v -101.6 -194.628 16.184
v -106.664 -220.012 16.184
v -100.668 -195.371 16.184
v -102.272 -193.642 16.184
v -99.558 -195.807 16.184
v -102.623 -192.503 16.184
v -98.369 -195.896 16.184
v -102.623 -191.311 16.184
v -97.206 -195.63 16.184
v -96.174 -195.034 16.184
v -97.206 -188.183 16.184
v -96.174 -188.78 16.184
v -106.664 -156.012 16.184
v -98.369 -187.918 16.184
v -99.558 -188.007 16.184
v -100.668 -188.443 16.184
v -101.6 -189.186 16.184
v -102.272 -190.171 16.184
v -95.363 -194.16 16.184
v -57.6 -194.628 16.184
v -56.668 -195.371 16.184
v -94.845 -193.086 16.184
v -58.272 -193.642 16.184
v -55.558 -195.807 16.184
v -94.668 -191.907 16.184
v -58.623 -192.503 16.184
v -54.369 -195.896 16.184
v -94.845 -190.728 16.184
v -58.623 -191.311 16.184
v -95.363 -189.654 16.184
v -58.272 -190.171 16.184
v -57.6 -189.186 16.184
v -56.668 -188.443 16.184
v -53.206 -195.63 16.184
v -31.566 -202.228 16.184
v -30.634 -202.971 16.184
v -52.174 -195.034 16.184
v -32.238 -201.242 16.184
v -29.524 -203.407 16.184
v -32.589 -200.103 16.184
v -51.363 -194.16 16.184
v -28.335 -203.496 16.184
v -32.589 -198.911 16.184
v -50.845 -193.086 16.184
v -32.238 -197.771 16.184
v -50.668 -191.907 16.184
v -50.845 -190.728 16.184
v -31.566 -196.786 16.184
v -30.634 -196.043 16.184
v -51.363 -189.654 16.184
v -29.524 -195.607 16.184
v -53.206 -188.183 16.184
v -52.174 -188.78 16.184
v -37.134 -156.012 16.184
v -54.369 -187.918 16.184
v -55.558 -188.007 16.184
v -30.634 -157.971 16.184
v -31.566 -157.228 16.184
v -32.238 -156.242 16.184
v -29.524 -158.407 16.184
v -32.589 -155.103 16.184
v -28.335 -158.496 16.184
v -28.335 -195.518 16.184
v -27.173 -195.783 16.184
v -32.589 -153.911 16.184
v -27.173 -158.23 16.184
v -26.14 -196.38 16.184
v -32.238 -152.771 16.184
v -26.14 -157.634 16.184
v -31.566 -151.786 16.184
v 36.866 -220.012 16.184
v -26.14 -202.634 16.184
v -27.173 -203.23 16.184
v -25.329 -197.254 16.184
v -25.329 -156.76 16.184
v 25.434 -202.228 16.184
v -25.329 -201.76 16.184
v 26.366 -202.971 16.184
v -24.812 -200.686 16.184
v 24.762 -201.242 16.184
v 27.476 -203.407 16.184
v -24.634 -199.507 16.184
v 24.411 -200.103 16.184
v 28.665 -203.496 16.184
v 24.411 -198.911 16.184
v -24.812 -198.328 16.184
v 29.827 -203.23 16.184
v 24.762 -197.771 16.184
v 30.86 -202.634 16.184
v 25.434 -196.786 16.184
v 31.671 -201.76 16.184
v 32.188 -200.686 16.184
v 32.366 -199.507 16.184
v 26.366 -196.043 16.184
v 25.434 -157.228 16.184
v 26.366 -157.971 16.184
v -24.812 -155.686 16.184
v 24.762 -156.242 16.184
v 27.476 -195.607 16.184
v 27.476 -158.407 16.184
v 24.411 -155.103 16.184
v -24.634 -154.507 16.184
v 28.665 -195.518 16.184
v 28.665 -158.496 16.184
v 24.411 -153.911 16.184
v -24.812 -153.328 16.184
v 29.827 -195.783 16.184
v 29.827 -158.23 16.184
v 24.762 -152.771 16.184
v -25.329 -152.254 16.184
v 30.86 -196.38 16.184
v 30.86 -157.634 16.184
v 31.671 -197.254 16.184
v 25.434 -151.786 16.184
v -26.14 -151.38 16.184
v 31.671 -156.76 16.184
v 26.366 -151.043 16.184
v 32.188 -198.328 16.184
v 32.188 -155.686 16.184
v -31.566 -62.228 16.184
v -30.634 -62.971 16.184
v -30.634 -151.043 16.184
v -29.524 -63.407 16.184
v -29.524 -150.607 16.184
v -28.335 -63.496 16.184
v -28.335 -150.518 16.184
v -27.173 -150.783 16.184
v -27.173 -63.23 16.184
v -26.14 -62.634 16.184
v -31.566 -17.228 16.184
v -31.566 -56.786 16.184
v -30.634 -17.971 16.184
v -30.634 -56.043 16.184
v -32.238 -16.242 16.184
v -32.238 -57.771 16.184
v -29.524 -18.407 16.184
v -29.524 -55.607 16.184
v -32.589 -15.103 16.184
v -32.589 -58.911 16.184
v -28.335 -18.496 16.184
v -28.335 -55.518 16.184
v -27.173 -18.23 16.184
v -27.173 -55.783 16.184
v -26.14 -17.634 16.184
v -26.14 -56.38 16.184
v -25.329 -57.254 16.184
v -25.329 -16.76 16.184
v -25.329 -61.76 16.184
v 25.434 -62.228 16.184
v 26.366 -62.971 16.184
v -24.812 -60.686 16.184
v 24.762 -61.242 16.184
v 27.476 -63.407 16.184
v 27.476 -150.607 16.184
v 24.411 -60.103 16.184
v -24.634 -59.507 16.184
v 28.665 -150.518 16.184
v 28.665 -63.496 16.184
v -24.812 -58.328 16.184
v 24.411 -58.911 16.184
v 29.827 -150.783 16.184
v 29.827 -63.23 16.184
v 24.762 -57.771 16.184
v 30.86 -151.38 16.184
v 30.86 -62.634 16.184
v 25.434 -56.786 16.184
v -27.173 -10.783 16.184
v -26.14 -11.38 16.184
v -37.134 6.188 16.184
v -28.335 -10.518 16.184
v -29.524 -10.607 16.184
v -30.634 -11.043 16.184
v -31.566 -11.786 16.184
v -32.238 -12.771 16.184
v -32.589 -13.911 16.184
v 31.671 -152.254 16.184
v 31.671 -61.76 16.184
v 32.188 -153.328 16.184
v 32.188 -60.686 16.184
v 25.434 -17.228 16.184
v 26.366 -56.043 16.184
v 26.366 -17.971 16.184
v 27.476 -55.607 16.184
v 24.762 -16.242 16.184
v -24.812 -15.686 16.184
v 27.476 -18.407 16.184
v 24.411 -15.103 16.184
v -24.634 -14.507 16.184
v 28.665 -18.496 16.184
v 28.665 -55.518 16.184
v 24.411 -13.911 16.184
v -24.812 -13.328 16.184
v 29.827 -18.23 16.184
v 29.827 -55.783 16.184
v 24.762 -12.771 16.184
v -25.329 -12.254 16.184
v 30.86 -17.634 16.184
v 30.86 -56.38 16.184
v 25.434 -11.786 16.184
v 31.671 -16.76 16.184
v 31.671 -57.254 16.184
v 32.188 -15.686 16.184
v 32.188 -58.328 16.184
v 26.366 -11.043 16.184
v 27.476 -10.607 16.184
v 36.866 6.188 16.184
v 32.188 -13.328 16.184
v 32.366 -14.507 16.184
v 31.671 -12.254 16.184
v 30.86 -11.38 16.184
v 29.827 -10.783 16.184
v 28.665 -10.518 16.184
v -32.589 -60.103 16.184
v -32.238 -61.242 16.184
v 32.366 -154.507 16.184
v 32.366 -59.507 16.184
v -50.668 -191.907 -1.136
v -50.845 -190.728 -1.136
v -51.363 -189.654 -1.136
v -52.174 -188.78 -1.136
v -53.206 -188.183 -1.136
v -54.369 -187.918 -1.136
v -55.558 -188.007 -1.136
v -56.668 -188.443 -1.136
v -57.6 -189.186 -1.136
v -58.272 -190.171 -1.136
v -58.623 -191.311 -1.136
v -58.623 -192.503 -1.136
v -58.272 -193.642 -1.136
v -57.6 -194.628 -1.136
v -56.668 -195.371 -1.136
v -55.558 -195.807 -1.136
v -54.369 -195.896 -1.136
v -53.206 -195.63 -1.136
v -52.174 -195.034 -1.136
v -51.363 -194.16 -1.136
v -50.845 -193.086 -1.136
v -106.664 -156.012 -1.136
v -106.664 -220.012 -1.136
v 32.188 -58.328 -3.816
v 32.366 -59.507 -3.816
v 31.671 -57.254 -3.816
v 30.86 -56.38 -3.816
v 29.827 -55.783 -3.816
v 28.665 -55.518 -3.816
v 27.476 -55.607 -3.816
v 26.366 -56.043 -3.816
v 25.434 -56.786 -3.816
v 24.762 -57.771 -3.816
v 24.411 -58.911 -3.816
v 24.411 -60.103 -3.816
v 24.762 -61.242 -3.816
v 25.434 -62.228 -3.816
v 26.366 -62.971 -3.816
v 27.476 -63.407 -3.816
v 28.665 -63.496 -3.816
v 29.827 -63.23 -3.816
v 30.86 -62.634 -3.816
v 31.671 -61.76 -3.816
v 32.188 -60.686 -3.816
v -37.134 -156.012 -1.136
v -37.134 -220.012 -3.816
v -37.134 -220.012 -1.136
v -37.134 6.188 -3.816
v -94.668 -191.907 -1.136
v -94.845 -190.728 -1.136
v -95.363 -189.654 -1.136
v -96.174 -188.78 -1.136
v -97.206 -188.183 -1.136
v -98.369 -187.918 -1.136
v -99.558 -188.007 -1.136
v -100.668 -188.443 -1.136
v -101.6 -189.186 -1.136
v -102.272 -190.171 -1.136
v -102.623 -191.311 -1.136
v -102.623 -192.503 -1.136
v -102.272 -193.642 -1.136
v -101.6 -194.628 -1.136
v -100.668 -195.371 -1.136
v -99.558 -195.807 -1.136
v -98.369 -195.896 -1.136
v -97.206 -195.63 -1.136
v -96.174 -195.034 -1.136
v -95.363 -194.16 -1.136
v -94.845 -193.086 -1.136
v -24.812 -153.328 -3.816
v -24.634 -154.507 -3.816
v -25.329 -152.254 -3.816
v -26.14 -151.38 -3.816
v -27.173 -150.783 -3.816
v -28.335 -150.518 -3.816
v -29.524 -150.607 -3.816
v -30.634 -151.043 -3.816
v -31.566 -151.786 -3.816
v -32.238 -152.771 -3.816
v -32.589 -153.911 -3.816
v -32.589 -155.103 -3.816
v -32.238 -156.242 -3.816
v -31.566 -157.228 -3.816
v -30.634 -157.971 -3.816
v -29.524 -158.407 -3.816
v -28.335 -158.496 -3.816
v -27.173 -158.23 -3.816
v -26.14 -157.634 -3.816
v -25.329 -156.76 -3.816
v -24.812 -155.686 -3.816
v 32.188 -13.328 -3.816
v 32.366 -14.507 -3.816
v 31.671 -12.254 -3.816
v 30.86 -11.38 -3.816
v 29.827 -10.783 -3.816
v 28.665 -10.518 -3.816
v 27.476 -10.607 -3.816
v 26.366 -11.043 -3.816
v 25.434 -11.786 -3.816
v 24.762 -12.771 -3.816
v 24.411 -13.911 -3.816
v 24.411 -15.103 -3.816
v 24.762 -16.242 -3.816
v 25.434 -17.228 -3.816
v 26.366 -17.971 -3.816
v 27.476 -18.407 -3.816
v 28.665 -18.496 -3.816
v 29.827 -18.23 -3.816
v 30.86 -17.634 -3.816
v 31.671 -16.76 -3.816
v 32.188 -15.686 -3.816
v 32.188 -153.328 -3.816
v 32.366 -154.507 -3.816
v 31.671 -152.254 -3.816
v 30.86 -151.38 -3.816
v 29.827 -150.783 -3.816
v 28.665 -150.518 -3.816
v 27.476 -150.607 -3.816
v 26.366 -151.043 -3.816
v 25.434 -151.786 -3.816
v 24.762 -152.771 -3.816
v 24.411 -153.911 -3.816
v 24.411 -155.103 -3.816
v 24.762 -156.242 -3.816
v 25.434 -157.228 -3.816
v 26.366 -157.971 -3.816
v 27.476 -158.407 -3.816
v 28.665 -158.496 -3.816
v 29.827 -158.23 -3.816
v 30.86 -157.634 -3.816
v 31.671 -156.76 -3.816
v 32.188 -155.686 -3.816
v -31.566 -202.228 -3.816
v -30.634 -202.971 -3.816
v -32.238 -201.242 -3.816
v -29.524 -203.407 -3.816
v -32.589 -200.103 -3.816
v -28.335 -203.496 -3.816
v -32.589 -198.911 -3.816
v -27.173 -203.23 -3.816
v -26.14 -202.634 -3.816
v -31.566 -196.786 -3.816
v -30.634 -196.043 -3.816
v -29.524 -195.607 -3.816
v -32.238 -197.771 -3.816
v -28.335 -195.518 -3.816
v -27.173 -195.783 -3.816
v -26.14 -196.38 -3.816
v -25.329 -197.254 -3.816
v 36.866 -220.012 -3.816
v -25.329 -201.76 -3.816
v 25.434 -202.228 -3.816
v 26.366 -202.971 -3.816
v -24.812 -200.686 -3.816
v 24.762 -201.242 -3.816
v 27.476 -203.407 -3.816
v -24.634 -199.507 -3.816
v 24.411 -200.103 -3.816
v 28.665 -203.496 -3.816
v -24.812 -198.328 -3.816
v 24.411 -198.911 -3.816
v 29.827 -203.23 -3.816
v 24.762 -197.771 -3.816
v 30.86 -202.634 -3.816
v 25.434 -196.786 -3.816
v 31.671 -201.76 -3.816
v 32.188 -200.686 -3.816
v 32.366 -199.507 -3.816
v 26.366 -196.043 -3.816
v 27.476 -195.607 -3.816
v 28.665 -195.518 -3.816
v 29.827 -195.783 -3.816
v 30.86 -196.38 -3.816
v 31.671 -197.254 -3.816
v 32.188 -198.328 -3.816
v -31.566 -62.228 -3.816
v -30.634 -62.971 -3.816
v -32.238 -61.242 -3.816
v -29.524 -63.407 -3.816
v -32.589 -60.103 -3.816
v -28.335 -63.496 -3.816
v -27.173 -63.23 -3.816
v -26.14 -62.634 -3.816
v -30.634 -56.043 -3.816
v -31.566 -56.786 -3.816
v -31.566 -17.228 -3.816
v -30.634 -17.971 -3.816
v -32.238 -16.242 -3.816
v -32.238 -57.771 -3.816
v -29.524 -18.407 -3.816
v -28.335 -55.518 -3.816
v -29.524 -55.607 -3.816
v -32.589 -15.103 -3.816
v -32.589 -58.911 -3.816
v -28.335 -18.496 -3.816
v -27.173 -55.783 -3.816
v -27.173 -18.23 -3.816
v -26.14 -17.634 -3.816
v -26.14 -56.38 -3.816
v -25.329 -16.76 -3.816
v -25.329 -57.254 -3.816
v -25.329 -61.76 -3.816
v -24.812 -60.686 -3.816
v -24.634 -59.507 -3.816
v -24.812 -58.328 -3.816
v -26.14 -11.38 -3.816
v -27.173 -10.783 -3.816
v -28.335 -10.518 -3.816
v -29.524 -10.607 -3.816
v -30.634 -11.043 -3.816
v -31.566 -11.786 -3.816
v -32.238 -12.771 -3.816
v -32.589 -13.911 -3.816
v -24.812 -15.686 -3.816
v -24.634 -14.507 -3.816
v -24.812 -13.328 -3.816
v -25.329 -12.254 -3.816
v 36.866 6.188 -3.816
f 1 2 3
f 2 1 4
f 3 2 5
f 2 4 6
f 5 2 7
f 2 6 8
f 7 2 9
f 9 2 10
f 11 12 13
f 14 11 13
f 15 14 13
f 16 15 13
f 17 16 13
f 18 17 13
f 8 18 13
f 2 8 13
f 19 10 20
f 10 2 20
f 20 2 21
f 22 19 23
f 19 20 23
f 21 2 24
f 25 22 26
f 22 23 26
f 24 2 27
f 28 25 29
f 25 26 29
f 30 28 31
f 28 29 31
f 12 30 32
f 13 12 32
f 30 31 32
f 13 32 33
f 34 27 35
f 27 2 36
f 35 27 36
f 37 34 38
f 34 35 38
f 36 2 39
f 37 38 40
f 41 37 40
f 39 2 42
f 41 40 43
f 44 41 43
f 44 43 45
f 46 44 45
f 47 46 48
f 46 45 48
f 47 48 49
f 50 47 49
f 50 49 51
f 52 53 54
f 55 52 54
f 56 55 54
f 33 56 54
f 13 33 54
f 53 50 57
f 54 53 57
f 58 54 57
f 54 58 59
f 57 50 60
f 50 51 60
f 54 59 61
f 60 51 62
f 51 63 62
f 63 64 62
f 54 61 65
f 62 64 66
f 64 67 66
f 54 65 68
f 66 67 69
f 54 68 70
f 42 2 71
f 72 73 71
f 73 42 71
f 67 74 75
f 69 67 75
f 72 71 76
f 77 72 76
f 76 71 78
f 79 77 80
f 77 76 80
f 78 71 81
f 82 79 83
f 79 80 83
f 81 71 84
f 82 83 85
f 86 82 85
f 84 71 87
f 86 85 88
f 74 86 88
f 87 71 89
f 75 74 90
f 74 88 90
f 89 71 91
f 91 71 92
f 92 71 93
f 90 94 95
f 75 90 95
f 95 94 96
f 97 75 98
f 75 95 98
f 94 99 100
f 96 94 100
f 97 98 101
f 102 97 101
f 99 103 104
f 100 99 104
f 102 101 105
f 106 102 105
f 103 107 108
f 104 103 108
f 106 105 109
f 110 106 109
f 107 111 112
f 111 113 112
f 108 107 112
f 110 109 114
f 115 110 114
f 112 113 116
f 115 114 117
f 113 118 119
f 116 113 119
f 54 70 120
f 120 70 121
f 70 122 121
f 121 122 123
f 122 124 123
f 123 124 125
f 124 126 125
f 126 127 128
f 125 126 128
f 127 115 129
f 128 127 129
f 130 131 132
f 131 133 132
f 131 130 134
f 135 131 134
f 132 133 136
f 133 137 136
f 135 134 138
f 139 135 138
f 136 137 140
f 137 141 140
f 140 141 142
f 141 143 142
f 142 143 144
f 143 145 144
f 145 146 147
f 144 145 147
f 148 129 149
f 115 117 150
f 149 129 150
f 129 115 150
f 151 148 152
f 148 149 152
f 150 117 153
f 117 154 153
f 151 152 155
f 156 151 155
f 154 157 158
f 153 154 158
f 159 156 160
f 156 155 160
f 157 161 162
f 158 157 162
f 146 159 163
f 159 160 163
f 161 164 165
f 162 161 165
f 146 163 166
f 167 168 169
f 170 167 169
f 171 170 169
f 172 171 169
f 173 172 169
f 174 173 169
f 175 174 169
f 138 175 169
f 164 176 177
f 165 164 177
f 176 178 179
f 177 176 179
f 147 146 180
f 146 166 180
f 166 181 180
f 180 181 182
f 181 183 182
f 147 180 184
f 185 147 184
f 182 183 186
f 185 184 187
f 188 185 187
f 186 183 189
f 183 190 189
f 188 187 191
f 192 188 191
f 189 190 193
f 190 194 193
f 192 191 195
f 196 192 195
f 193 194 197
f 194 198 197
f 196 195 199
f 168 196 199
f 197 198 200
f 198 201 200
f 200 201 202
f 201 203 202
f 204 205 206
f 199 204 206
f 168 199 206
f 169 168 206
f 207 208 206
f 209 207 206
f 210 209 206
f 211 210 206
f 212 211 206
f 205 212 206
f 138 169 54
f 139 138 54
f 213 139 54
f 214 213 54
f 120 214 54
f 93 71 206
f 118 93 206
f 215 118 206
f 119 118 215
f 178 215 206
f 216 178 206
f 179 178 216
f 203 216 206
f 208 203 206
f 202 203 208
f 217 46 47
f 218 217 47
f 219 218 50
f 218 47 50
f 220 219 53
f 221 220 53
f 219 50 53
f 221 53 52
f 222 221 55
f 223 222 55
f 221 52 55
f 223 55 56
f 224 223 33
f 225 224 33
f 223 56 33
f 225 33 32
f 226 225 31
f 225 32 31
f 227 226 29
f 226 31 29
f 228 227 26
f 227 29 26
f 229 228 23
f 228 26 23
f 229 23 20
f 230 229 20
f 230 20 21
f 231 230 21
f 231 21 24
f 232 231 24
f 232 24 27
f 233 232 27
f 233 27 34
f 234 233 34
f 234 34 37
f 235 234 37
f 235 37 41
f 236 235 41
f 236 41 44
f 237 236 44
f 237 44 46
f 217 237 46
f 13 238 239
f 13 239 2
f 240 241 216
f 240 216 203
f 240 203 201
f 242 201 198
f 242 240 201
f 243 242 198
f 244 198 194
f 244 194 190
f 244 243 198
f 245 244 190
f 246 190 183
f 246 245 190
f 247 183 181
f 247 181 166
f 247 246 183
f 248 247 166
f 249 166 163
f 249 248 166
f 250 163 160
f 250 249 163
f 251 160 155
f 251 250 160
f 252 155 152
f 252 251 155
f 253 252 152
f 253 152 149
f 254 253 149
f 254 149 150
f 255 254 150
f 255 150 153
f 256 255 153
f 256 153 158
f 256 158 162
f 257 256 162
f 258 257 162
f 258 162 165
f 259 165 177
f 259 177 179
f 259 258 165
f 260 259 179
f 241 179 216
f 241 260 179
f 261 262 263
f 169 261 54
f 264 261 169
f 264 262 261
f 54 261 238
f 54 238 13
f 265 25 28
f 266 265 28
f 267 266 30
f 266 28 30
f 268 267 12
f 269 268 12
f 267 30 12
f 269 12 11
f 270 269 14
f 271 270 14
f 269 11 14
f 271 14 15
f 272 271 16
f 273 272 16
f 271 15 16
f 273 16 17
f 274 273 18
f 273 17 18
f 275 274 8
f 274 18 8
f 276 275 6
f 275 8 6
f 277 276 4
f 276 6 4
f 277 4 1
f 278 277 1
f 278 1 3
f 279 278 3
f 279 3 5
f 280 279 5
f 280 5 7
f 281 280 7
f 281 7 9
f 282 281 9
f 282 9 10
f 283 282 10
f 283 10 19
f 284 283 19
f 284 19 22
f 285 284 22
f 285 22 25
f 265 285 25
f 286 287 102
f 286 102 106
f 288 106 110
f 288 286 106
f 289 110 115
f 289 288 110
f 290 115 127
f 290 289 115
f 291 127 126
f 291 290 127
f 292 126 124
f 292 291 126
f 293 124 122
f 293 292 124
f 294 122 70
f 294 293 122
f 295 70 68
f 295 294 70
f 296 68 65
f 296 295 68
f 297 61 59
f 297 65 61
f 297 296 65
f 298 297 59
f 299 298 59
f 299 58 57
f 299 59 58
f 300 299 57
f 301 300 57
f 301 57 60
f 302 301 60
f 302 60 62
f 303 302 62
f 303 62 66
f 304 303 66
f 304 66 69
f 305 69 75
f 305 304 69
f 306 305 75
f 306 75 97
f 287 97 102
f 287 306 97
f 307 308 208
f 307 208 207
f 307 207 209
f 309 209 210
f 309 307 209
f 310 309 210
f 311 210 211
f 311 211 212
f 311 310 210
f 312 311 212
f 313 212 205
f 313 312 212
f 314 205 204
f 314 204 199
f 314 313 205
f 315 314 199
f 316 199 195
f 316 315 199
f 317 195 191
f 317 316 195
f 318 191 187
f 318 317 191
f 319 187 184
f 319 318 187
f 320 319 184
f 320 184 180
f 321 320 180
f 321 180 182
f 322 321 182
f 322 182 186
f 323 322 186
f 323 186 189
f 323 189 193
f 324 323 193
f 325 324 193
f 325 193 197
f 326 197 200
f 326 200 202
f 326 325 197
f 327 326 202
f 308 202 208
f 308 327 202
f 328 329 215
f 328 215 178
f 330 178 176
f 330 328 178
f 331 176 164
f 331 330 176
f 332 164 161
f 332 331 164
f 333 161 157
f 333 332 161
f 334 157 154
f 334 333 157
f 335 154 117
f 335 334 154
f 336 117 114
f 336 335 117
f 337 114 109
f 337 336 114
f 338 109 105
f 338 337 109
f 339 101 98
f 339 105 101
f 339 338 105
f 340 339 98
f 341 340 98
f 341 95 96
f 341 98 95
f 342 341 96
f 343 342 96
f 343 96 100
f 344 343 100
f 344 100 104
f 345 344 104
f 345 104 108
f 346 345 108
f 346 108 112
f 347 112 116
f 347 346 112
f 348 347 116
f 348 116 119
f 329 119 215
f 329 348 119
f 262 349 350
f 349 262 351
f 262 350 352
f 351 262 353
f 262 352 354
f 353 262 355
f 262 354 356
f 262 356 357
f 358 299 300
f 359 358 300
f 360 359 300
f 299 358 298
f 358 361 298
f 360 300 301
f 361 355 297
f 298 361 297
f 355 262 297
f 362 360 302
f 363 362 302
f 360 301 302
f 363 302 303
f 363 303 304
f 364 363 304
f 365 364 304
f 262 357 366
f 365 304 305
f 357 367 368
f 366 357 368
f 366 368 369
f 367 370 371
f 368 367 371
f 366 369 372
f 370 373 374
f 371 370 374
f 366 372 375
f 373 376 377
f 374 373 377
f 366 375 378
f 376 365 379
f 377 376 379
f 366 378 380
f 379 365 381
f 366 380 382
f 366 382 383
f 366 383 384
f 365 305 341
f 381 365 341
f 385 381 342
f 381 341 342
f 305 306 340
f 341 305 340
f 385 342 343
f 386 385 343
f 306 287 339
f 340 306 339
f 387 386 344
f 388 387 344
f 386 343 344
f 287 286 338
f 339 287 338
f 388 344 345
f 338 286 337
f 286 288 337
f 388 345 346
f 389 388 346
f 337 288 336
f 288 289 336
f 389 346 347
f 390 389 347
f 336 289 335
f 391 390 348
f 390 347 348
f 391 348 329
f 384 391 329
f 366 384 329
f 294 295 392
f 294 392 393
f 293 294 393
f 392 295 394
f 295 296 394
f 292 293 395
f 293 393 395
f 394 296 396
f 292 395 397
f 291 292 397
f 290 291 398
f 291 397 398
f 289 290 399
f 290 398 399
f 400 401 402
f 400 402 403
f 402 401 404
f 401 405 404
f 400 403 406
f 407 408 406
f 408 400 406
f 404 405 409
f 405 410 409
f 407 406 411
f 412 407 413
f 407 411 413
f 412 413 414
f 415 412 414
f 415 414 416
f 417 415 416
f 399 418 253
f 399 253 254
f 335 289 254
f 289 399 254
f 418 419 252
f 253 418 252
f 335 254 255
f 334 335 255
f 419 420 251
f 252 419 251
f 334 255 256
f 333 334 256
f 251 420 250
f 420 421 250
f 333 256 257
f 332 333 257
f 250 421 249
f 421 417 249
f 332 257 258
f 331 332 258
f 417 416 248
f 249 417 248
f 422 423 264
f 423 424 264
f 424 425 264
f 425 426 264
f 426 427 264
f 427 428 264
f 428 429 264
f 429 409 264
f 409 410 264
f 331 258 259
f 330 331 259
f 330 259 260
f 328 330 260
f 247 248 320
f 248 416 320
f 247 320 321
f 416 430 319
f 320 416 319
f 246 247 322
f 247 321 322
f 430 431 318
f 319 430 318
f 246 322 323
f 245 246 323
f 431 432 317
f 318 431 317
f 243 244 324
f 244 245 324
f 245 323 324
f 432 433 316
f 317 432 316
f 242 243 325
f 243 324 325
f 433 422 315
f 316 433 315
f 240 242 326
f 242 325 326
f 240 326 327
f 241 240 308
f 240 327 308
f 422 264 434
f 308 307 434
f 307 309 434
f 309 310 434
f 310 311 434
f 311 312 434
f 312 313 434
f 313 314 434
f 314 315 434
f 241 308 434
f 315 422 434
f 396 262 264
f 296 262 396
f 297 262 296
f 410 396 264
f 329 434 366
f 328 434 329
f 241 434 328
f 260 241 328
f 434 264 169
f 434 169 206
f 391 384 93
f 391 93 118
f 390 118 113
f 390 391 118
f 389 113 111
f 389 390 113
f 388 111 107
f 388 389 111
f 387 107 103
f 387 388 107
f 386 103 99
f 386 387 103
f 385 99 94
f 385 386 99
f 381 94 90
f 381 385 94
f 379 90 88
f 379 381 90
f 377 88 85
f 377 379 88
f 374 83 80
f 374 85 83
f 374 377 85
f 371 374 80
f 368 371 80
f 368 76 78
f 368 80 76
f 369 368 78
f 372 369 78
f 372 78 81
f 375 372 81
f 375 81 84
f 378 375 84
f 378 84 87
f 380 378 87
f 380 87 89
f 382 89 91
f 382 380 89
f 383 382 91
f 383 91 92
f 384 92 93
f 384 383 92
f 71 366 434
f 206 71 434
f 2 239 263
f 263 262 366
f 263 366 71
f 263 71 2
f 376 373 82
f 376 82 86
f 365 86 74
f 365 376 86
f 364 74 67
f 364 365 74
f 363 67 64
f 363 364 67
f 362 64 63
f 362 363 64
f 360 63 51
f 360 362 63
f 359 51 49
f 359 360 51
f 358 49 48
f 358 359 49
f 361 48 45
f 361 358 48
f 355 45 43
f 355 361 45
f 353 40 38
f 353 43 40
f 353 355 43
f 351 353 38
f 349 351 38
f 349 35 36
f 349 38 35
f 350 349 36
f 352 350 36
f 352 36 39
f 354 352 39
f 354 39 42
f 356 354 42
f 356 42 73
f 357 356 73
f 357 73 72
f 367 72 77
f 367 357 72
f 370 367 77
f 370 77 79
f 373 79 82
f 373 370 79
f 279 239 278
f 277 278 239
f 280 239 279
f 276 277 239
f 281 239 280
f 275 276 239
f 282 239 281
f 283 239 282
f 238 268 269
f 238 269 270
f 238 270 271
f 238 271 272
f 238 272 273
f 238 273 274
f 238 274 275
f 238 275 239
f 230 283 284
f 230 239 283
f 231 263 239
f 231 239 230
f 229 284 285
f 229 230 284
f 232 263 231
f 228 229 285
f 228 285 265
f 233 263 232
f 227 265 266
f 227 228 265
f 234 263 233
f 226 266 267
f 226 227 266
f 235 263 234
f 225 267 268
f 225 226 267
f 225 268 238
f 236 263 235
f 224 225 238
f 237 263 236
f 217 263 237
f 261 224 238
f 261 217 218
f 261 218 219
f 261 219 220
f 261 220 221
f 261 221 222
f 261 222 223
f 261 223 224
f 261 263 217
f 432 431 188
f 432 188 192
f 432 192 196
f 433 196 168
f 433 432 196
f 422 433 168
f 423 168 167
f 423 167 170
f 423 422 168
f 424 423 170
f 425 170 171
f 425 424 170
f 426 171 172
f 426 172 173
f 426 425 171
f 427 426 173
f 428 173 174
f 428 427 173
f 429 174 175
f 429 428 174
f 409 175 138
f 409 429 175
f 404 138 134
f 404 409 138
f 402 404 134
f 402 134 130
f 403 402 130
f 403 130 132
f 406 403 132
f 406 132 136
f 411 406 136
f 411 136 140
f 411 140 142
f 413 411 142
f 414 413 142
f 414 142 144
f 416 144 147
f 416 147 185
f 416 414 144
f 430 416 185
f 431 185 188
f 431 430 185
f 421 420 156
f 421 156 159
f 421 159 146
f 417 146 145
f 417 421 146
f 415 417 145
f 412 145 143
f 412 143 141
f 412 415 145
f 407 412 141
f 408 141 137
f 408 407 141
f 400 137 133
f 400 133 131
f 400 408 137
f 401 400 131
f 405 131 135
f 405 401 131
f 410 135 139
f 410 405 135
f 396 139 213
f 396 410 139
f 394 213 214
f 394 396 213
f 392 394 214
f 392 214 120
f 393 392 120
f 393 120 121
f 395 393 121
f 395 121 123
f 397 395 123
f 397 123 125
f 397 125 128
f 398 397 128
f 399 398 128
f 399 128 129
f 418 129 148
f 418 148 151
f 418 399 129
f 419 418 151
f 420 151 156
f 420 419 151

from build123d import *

# Parameters (mm, degrees)
SZKIC2_W                    = 74
SZKIC2_H                    = 226.2
DODANIE_WYCI_GNI_CIE1_DEPTH = 20
SZKIC3_W                    = 17.32
SZKIC3_H                    = 64
DODANIE_WYCI_GNI_CIE2_DEPTH = 69.53
SZKIC4_R                    = 3.999999999
WYTNIJ_WYCI_GNI_CIE1_DEPTH  = 20
SZKIC6_R                    = 4
WYTNIJ_WYCI_GNI_CIE3_DEPTH  = 21
SZKIC7_R                    = 4
WYTNIJ_WYCI_GNI_CIE4_DEPTH  = 20


with BuildPart() as part:
    # Szkic2 → Dodanie-wyciągnięcie1 (new body)
    with BuildSketch(Plane.XY.offset(-3.815865502)):
        with Locations((-0.134142184, -106.911615453)):
            Rectangle(SZKIC2_W, SZKIC2_H)
    extrude(amount=DODANIE_WYCI_GNI_CIE1_DEPTH)

    # Szkic3 → Dodanie-wyciągnięcie2 (add)
    with BuildSketch(Plane.ZY.offset(37.134142184)):
        with Locations((7.524134498, -188.011615453)):
            Rectangle(SZKIC3_W, SZKIC3_H)
    extrude(amount=DODANIE_WYCI_GNI_CIE2_DEPTH)

    # Szkic4 → Wytnij-wyciągnięcie1 (cut)
    with BuildSketch(Plane.XY.offset(16.184134498)):
        with Locations((-54.667677729, -191.906887131)):
            Circle(SZKIC4_R)
        with Locations((-98.667677729, -191.906887131)):
            Circle(SZKIC4_R)
    extrude(amount=-WYTNIJ_WYCI_GNI_CIE1_DEPTH, mode=Mode.SUBTRACT)

    # Szkic6 → Wytnij-wyciągnięcie3 (cut)
    with BuildSketch(Plane.XY.offset(-4.115865502)):
        with Locations((28.365857818, -199.506887131)):
            Circle(SZKIC6_R)
        with Locations((-28.634142182, -199.506887131)):
            Circle(SZKIC6_R)
        with Locations((-28.634142182, -154.506887131)):
            Circle(SZKIC6_R)
        with Locations((28.365857818, -154.506887131)):
            Circle(SZKIC6_R)
    extrude(amount=WYTNIJ_WYCI_GNI_CIE3_DEPTH, mode=Mode.SUBTRACT)

    # Szkic7 → Wytnij-wyciągnięcie4 (cut)
    with BuildSketch(Plane.XY.offset(-3.815865502)):
        with Locations((28.365857816, -14.506887131)):
            Circle(SZKIC7_R)
        with Locations((-28.634142184, -14.506887131)):
            Circle(SZKIC7_R)
        with Locations((-28.634142184, -59.506887131)):
            Circle(SZKIC7_R)
        with Locations((28.365857816, -59.506887131)):
            Circle(SZKIC7_R)
    extrude(amount=WYTNIJ_WYCI_GNI_CIE4_DEPTH, mode=Mode.SUBTRACT)


solid = part.part
